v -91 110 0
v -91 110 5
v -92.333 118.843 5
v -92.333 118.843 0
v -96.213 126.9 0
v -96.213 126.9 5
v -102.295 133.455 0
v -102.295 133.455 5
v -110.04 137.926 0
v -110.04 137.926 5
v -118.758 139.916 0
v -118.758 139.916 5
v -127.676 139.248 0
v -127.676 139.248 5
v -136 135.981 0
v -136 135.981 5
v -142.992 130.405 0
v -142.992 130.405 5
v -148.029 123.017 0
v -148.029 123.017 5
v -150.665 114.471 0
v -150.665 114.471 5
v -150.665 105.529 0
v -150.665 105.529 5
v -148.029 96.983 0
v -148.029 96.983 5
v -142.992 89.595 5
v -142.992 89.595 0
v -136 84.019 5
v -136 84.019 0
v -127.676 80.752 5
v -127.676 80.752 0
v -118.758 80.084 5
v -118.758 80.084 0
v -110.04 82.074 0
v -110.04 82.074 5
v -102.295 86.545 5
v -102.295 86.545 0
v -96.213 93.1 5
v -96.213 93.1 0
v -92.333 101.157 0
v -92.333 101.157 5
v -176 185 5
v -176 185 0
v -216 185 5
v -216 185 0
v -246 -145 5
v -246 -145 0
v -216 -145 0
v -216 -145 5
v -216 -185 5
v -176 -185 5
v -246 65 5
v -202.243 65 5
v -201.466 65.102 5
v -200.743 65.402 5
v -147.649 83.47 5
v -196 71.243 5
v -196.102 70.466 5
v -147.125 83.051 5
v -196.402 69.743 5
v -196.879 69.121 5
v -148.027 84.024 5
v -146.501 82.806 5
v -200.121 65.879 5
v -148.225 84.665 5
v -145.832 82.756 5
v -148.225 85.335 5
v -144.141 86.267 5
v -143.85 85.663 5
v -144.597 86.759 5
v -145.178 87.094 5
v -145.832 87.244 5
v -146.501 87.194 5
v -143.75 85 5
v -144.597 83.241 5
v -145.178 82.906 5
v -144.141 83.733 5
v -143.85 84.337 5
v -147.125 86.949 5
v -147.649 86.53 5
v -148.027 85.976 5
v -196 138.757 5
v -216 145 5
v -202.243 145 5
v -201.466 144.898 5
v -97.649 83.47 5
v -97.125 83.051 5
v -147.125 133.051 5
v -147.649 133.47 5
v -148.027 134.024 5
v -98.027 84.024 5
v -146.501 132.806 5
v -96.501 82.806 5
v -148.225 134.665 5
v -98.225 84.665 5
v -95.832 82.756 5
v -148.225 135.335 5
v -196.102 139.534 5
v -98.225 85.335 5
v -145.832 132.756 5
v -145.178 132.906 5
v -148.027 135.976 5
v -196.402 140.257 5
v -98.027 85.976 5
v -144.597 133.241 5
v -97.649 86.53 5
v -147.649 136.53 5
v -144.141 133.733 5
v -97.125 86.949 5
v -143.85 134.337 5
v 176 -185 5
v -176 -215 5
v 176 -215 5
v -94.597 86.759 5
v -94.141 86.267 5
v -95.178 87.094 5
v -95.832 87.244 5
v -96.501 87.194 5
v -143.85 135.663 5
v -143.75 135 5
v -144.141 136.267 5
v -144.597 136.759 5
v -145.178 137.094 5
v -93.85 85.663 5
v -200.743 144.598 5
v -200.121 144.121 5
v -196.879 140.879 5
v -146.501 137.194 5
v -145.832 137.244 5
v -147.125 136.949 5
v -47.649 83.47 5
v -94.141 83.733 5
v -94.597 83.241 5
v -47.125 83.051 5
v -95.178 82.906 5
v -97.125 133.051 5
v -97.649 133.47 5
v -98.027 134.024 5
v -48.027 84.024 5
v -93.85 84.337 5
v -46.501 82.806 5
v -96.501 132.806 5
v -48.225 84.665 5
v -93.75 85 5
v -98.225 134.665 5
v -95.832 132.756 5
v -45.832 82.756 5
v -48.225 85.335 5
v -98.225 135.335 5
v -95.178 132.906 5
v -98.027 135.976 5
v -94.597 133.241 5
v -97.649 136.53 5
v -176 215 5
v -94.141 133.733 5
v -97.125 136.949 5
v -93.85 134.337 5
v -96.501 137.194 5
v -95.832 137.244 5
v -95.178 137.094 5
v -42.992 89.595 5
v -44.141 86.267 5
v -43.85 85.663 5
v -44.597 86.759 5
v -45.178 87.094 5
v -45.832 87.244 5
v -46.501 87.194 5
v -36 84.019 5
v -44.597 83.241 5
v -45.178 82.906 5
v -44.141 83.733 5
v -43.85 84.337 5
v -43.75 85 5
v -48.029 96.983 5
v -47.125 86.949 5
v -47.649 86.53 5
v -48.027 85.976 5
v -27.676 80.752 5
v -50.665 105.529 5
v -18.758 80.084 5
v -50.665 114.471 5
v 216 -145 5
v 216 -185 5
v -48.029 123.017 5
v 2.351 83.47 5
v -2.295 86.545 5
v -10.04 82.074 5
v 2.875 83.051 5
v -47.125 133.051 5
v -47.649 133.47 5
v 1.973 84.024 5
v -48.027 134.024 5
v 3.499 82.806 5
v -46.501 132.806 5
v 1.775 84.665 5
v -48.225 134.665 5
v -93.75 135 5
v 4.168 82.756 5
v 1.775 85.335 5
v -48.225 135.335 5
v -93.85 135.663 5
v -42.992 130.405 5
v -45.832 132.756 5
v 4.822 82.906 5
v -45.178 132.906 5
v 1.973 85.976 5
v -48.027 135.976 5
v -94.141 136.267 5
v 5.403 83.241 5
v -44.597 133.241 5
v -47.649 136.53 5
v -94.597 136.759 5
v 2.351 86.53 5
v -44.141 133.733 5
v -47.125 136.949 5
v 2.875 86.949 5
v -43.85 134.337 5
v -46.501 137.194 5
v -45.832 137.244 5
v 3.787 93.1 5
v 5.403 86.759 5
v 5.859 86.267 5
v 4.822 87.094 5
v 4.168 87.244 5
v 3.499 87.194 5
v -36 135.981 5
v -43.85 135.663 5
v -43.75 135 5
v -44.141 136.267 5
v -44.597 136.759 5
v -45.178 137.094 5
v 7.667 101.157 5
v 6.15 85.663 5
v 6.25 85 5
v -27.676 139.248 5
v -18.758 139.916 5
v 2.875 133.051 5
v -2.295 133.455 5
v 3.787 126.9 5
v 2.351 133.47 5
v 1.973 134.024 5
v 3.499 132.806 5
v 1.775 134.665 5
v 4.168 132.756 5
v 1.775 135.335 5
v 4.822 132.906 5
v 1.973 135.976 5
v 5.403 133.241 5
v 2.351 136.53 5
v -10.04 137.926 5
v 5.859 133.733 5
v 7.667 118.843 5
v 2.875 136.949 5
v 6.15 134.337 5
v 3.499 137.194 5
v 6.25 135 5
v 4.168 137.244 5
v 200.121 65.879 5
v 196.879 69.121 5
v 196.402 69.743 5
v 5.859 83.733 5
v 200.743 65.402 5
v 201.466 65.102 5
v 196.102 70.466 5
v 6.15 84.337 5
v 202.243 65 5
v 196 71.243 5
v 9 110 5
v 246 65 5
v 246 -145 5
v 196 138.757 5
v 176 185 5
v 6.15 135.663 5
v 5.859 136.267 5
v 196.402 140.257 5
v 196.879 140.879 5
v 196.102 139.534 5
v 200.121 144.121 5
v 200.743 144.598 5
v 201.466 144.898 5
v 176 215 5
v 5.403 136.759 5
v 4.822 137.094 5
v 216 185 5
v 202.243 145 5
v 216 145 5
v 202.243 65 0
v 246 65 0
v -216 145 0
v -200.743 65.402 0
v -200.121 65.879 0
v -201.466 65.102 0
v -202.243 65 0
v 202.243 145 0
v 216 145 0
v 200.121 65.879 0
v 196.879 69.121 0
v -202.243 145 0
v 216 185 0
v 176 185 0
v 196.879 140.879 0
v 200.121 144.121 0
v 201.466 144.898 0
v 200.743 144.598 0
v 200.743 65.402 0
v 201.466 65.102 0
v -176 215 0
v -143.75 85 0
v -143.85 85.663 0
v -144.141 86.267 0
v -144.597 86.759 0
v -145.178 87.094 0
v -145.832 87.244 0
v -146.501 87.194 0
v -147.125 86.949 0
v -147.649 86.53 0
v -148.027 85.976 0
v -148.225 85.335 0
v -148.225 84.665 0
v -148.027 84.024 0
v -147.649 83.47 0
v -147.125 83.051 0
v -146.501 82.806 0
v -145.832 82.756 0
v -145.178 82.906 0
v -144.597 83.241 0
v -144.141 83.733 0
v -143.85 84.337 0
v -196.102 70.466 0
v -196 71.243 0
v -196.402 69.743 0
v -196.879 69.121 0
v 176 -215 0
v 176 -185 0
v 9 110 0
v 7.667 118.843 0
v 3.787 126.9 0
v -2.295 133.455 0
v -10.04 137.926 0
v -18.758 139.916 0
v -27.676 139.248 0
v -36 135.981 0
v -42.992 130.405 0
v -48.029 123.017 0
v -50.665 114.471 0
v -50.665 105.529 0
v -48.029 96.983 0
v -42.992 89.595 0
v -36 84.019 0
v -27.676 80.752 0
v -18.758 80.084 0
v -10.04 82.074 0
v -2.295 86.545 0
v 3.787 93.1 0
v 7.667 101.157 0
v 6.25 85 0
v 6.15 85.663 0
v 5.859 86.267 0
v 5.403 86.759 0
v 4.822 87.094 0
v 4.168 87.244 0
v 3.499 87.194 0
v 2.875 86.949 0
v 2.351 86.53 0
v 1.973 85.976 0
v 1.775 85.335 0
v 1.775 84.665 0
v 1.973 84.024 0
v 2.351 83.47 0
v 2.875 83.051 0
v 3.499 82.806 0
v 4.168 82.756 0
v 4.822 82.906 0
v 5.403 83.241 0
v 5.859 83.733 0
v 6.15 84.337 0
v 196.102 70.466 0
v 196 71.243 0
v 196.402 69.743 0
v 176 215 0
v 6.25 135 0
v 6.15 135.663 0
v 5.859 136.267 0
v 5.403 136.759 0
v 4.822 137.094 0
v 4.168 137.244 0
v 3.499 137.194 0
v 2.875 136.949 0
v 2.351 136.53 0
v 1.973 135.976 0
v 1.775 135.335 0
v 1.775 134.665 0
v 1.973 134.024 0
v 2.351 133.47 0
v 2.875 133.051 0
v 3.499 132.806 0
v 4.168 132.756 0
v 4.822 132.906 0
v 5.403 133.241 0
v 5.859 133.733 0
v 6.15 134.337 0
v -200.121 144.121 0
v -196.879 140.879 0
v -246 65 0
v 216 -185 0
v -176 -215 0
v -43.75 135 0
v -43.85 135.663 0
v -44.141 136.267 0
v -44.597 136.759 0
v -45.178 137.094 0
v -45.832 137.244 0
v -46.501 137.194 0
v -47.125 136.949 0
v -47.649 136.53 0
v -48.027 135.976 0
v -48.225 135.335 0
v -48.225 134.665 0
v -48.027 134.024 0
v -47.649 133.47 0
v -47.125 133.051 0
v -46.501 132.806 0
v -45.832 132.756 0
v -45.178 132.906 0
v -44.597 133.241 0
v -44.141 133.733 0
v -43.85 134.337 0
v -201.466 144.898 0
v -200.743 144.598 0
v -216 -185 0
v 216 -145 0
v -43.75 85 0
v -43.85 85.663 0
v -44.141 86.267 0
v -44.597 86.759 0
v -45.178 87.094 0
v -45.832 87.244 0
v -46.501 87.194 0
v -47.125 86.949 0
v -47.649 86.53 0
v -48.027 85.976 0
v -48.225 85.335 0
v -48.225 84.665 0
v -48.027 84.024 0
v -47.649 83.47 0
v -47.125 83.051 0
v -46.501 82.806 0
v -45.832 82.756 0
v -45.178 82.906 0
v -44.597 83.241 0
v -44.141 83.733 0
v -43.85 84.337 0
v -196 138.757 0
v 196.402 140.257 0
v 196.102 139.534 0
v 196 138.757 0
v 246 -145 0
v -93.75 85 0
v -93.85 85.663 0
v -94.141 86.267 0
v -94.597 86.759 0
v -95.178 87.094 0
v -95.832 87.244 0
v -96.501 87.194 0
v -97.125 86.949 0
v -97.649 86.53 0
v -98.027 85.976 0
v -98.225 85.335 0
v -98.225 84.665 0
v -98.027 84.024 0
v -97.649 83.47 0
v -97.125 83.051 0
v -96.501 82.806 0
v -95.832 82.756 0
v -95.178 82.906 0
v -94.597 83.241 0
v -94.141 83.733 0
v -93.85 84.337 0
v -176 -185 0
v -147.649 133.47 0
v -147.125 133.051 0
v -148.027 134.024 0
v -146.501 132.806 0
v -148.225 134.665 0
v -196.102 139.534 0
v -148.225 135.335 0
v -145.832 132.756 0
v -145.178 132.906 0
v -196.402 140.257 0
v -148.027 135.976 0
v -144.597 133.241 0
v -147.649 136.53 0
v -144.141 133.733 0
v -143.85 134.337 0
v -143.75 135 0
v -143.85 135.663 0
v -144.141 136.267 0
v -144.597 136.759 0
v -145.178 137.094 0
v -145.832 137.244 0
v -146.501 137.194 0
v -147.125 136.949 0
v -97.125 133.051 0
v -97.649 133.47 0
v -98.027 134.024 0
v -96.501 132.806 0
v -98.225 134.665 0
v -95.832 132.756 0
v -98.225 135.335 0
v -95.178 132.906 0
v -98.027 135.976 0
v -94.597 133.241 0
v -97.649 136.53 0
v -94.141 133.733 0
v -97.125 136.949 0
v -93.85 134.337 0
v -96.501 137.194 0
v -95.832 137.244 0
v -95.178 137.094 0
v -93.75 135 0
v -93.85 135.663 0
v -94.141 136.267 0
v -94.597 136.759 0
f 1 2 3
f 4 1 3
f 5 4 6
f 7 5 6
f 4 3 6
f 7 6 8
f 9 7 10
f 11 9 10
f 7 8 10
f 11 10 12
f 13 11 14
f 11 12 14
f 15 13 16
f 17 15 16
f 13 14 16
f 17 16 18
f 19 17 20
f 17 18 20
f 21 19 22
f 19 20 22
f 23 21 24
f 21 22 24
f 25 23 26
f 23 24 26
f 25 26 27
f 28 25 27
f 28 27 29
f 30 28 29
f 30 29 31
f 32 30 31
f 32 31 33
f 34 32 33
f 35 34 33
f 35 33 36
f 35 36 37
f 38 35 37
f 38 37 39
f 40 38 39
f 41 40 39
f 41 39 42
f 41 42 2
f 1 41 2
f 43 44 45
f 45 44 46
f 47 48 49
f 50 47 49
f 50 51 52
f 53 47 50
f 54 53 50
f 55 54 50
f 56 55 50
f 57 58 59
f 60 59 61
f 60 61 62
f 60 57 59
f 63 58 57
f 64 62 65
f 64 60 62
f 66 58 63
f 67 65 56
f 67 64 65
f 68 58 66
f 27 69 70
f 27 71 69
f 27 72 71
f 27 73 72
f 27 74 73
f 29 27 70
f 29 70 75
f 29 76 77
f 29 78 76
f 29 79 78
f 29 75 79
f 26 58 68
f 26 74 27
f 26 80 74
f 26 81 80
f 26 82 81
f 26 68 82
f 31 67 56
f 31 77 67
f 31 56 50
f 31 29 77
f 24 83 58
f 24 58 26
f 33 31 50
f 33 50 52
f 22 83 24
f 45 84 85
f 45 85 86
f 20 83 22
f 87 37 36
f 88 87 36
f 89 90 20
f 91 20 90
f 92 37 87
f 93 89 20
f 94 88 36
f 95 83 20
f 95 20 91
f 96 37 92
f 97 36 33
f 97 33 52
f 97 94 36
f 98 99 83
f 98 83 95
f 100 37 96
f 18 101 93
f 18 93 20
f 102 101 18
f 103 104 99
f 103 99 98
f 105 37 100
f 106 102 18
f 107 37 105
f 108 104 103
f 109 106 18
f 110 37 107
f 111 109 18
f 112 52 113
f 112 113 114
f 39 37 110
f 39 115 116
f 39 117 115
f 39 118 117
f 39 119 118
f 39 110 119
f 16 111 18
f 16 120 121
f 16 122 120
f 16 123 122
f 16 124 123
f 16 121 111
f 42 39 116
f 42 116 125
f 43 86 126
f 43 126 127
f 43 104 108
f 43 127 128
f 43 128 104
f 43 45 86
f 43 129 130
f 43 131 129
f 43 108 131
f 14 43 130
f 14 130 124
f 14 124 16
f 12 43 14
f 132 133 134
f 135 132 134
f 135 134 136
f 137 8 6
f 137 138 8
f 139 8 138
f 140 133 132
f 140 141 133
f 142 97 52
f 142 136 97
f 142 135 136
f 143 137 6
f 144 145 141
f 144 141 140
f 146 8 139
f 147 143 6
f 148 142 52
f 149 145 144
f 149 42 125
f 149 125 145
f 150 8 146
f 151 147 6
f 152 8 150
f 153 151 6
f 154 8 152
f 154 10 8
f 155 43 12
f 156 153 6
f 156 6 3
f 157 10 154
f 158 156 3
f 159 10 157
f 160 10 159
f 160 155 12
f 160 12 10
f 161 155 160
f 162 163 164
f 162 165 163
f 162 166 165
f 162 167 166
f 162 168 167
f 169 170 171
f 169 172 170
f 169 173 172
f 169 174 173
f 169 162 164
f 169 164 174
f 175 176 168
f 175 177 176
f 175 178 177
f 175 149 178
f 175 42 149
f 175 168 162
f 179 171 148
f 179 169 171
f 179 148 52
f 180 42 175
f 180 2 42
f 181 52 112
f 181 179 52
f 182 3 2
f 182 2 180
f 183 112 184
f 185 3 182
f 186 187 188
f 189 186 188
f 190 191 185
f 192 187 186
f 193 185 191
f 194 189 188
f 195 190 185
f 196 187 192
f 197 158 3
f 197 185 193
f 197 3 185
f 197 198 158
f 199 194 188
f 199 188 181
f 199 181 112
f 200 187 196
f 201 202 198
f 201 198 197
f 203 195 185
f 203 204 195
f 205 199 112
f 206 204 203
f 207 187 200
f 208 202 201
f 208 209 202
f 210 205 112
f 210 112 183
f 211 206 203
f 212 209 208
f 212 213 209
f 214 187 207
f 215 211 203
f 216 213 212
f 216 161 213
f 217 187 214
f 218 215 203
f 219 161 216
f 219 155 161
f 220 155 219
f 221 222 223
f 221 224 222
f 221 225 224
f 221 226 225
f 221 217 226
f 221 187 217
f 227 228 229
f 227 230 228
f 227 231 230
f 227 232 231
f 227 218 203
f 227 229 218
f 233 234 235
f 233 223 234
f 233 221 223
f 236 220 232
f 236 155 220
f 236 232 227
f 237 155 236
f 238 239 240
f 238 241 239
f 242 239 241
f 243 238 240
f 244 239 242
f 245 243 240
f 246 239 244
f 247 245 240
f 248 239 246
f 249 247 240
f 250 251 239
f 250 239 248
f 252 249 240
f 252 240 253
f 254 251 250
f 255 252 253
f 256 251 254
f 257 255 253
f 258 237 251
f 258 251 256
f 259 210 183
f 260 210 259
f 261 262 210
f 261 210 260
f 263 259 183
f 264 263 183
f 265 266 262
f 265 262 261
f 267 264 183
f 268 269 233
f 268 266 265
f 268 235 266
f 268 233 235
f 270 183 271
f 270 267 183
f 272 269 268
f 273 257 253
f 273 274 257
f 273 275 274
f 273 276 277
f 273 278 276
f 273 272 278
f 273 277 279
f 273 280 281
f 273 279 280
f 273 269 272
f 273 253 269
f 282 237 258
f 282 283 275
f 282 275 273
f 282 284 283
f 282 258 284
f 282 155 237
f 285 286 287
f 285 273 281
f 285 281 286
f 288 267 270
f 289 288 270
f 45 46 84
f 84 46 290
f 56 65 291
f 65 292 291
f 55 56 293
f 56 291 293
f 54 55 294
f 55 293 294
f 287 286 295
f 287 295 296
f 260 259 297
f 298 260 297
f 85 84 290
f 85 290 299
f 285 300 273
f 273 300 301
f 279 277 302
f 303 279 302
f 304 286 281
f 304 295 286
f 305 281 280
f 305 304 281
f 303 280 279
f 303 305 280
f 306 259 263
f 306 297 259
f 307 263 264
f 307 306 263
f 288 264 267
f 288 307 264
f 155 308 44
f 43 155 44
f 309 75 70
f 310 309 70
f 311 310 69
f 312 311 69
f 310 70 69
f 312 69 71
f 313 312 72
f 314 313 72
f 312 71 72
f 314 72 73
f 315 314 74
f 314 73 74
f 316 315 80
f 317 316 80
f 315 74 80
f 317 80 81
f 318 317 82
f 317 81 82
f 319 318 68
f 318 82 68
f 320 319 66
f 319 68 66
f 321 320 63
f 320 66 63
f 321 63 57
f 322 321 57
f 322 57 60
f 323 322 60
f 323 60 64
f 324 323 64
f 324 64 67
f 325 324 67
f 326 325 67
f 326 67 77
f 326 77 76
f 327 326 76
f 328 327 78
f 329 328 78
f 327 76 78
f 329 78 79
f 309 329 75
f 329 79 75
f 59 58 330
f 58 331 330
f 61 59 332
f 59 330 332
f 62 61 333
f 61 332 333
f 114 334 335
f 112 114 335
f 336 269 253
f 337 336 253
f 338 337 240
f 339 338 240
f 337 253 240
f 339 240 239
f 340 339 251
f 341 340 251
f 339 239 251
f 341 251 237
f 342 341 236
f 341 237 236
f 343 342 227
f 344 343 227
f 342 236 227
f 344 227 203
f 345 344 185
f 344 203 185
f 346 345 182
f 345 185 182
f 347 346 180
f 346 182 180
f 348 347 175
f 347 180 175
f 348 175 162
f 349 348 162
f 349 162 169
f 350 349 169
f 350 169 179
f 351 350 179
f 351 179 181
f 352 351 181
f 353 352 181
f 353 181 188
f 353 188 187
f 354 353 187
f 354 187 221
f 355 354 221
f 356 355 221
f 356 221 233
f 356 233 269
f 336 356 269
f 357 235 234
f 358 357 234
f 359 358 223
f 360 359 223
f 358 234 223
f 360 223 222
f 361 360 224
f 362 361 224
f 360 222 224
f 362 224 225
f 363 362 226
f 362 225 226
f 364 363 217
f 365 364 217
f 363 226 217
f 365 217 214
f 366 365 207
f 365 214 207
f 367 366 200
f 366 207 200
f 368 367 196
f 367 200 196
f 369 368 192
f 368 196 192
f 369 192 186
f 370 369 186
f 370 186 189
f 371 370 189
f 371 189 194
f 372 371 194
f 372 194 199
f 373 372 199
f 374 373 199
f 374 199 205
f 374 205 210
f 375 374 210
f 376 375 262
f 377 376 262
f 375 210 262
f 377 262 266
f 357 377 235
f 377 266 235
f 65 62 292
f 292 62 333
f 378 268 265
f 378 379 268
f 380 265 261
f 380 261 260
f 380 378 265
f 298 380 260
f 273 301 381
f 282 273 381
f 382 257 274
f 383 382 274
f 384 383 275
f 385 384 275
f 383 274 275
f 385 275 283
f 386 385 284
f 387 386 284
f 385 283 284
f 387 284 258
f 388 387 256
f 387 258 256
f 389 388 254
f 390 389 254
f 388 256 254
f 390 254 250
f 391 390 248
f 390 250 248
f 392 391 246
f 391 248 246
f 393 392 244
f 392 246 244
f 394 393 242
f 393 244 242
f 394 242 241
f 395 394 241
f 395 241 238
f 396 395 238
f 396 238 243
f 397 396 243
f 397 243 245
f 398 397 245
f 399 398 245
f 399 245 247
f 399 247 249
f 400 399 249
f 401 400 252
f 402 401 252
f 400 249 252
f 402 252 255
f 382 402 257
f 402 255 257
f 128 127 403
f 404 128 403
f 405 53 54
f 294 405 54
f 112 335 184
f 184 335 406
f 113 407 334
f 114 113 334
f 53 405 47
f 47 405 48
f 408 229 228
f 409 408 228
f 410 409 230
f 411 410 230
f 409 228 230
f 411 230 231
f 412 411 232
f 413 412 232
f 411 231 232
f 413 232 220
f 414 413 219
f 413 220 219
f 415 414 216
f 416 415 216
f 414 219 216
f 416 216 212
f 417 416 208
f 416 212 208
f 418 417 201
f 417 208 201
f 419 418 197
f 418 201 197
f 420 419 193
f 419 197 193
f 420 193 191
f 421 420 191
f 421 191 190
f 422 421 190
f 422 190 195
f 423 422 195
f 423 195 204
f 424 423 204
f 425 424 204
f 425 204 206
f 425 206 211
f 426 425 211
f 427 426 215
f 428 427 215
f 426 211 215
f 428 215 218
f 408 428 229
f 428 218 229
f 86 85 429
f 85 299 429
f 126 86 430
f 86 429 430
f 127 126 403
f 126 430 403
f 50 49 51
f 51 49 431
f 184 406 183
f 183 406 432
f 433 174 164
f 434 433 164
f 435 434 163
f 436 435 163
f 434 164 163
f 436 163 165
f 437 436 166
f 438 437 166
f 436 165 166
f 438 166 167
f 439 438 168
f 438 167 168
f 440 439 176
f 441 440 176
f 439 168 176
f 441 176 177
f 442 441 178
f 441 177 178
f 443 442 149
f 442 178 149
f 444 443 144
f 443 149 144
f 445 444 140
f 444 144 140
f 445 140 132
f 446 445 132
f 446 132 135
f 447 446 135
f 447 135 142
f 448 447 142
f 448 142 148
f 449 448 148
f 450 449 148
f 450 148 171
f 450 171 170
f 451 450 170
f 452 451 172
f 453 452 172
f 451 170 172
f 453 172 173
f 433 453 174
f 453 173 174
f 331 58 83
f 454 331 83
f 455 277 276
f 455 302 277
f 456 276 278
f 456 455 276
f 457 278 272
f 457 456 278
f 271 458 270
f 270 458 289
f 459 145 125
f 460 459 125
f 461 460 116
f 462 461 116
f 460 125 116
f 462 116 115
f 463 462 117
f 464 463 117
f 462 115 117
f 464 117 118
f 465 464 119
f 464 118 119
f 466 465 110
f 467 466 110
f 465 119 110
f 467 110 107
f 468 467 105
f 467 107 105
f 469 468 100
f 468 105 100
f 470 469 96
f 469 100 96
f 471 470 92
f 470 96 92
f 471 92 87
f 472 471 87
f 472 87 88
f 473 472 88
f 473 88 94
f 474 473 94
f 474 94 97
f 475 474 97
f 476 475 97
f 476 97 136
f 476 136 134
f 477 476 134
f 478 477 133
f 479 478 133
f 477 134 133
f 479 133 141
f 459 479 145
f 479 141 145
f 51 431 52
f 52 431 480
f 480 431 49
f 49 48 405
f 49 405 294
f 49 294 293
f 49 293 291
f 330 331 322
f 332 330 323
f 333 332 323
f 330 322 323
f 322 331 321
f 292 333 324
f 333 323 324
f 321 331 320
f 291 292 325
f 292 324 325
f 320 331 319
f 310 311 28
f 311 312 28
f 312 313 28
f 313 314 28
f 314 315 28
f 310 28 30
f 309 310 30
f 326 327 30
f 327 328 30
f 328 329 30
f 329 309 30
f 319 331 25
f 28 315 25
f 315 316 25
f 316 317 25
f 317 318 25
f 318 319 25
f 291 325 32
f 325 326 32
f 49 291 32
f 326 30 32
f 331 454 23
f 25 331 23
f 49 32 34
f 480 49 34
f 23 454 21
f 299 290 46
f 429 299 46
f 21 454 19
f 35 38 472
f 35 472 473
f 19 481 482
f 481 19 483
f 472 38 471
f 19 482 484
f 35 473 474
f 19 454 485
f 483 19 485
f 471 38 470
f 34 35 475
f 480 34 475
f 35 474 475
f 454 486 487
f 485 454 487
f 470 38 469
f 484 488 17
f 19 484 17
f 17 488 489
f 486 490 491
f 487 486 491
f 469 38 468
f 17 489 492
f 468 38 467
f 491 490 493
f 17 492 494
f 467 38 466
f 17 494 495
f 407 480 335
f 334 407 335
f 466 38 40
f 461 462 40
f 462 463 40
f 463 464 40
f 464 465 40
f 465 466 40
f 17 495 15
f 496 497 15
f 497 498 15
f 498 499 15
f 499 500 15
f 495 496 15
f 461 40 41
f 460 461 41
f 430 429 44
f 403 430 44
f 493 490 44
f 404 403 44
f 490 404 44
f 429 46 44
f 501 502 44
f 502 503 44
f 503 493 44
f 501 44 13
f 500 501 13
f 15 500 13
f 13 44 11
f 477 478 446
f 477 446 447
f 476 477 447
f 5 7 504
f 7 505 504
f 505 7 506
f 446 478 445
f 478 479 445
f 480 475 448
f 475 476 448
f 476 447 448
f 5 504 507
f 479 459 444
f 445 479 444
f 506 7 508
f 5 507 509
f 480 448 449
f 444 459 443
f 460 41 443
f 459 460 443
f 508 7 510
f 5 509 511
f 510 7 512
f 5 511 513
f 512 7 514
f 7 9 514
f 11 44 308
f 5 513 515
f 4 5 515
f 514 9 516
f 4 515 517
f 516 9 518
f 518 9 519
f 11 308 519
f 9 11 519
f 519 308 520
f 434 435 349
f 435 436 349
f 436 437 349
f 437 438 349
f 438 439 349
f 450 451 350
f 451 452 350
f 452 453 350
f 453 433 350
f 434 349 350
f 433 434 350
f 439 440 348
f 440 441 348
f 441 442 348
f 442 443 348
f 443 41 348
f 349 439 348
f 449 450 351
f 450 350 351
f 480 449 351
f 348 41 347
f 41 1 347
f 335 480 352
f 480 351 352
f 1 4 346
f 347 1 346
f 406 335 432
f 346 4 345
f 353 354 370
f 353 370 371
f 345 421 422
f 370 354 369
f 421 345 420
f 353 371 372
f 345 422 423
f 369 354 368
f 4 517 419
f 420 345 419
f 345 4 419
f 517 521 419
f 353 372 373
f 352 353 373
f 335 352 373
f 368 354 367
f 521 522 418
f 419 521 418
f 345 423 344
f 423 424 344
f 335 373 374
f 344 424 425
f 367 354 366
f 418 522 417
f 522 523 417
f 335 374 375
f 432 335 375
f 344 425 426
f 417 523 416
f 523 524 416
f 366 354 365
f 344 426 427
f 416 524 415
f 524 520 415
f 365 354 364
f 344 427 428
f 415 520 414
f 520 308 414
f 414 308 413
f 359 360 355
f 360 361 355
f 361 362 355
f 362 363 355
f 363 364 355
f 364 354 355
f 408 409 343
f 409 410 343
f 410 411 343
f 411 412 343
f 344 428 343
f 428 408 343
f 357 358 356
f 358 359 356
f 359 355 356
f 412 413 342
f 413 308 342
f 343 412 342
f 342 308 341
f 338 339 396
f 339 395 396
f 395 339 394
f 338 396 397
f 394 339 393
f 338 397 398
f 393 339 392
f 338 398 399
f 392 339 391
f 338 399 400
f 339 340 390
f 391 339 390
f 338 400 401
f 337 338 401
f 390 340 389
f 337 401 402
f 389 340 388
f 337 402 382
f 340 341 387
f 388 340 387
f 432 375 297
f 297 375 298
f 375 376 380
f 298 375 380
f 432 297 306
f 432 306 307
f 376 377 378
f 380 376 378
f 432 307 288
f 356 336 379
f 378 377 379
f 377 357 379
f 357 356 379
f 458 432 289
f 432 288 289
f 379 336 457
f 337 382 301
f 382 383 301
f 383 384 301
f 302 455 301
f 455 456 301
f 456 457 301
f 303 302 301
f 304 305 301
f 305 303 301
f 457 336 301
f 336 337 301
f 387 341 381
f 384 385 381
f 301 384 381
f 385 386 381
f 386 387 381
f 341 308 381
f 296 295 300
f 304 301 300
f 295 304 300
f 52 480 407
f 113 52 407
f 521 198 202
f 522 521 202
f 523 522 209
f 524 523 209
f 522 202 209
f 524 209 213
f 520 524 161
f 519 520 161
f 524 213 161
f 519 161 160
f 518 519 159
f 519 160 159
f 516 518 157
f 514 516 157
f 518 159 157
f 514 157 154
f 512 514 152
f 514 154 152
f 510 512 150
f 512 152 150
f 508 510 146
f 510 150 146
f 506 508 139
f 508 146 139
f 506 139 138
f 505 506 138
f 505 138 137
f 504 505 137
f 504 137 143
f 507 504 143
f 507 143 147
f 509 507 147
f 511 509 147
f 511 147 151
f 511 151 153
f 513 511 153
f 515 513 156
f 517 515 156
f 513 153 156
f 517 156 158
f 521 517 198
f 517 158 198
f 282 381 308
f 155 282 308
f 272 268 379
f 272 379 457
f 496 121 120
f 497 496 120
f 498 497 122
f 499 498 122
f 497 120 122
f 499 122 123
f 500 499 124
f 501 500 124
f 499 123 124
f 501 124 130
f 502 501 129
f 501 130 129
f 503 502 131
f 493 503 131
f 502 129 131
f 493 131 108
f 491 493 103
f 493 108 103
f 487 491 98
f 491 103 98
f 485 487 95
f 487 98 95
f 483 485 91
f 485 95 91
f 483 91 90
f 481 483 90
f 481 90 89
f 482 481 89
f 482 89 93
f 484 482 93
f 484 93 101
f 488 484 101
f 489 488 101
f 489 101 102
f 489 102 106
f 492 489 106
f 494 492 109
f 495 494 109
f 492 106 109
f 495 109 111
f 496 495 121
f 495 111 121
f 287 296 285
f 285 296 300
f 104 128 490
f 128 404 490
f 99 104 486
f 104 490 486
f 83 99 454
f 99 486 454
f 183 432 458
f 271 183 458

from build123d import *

# Parameters (mm, degrees)
SALIENTE_EXTRUIR1_DEPTH = 5
CROQUIS3_W              = 50
CROQUIS3_H              = 80
CORTAR_EXTRUIR2_DEPTH   = 10
CHAFL_N1_SIZE           = 5
REDONDEO1_R             = 3
CROQUIS4_R              = 2.25
CORTAR_EXTRUIR3_DEPTH   = 5
CROQUIS5_R              = 30
CORTAR_EXTRUIR4_DEPTH   = 327.750669471


with BuildPart() as part:
    # Croquis1 → Saliente-Extruir1 (new body)
    with BuildSketch(Plane.XY):
        Polygon((0, 215), (0, 0), (246, 0), (246, 145), (216, 145), (216, 185), (176, 185), (176, 215), align=None)
        Polygon((-246, 145), (-246, 0), (0, 0), (0, 215), (-176, 215), (-176, 185), (-216, 185), (-216, 145), align=None)
        Polygon((0, 0), (-246, 0), (-246, -145), (-216, -145), (-216, -185), (-176, -185), (-176, -215), (176, -215), (176, -185), (216, -185), (216, -145), (246, -145), (246, 0), align=None)
    extrude(amount=SALIENTE_EXTRUIR1_DEPTH)

    # Croquis3 → Cortar-Extruir2 (cut)
    with BuildSketch(Plane.XY.offset(5)):
        with Locations((-221, 105)):
            Rectangle(CROQUIS3_W, CROQUIS3_H)
        with Locations((221, 105)):
            Rectangle(CROQUIS3_W, CROQUIS3_H)
    extrude(amount=-CORTAR_EXTRUIR2_DEPTH, mode=Mode.SUBTRACT)

    # Chaflán1
    chafl_n1_edges = [part.edges().sort_by_distance(p)[0] for p in [
        (-196, 65, 2.5),
        (-196, 145, 2.5),
        (196, 65, 2.5),
        (196, 145, 2.5),
    ]]
    chamfer(chafl_n1_edges, length=CHAFL_N1_SIZE)

    # Redondeo1
    redondeo1_edges = [part.edges().sort_by_distance(p)[0] for p in [
        (-196, 140, 2.5),
        (-196, 70, 2.5),
        (-201, 65, 2.5),
        (-201, 145, 2.5),
        (201, 65, 2.5),
        (196, 140, 2.5),
        (196, 70, 2.5),
        (201, 145, 2.5),
    ]]
    fillet(redondeo1_edges, radius=REDONDEO1_R)

    # Croquis4 → Cortar-Extruir3 (cut, symmetric)
    with BuildSketch(Plane.XY.offset(5)):
        with Locations((-146, 135)):
            Circle(CROQUIS4_R)
        with Locations((-96, 135)):
            Circle(CROQUIS4_R)
        with Locations((-146, 85)):
            Circle(CROQUIS4_R)
        with Locations((-96, 85)):
            Circle(CROQUIS4_R)
        with Locations((-46, 135)):
            Circle(CROQUIS4_R)
        with Locations((-46, 85)):
            Circle(CROQUIS4_R)
        with Locations((4, 135)):
            Circle(CROQUIS4_R)
        with Locations((4, 85)):
            Circle(CROQUIS4_R)
    extrude(amount=CORTAR_EXTRUIR3_DEPTH, both=True, mode=Mode.SUBTRACT)

    # Croquis5 → Cortar-Extruir4 (cut, through all)
    with BuildSketch(Plane.XY.offset(5)):
        with Locations((-121, 110)):
            Circle(CROQUIS5_R)
        with Locations((-21, 110)):
            Circle(CROQUIS5_R)
    extrude(amount=-CORTAR_EXTRUIR4_DEPTH, mode=Mode.SUBTRACT)


solid = part.part
